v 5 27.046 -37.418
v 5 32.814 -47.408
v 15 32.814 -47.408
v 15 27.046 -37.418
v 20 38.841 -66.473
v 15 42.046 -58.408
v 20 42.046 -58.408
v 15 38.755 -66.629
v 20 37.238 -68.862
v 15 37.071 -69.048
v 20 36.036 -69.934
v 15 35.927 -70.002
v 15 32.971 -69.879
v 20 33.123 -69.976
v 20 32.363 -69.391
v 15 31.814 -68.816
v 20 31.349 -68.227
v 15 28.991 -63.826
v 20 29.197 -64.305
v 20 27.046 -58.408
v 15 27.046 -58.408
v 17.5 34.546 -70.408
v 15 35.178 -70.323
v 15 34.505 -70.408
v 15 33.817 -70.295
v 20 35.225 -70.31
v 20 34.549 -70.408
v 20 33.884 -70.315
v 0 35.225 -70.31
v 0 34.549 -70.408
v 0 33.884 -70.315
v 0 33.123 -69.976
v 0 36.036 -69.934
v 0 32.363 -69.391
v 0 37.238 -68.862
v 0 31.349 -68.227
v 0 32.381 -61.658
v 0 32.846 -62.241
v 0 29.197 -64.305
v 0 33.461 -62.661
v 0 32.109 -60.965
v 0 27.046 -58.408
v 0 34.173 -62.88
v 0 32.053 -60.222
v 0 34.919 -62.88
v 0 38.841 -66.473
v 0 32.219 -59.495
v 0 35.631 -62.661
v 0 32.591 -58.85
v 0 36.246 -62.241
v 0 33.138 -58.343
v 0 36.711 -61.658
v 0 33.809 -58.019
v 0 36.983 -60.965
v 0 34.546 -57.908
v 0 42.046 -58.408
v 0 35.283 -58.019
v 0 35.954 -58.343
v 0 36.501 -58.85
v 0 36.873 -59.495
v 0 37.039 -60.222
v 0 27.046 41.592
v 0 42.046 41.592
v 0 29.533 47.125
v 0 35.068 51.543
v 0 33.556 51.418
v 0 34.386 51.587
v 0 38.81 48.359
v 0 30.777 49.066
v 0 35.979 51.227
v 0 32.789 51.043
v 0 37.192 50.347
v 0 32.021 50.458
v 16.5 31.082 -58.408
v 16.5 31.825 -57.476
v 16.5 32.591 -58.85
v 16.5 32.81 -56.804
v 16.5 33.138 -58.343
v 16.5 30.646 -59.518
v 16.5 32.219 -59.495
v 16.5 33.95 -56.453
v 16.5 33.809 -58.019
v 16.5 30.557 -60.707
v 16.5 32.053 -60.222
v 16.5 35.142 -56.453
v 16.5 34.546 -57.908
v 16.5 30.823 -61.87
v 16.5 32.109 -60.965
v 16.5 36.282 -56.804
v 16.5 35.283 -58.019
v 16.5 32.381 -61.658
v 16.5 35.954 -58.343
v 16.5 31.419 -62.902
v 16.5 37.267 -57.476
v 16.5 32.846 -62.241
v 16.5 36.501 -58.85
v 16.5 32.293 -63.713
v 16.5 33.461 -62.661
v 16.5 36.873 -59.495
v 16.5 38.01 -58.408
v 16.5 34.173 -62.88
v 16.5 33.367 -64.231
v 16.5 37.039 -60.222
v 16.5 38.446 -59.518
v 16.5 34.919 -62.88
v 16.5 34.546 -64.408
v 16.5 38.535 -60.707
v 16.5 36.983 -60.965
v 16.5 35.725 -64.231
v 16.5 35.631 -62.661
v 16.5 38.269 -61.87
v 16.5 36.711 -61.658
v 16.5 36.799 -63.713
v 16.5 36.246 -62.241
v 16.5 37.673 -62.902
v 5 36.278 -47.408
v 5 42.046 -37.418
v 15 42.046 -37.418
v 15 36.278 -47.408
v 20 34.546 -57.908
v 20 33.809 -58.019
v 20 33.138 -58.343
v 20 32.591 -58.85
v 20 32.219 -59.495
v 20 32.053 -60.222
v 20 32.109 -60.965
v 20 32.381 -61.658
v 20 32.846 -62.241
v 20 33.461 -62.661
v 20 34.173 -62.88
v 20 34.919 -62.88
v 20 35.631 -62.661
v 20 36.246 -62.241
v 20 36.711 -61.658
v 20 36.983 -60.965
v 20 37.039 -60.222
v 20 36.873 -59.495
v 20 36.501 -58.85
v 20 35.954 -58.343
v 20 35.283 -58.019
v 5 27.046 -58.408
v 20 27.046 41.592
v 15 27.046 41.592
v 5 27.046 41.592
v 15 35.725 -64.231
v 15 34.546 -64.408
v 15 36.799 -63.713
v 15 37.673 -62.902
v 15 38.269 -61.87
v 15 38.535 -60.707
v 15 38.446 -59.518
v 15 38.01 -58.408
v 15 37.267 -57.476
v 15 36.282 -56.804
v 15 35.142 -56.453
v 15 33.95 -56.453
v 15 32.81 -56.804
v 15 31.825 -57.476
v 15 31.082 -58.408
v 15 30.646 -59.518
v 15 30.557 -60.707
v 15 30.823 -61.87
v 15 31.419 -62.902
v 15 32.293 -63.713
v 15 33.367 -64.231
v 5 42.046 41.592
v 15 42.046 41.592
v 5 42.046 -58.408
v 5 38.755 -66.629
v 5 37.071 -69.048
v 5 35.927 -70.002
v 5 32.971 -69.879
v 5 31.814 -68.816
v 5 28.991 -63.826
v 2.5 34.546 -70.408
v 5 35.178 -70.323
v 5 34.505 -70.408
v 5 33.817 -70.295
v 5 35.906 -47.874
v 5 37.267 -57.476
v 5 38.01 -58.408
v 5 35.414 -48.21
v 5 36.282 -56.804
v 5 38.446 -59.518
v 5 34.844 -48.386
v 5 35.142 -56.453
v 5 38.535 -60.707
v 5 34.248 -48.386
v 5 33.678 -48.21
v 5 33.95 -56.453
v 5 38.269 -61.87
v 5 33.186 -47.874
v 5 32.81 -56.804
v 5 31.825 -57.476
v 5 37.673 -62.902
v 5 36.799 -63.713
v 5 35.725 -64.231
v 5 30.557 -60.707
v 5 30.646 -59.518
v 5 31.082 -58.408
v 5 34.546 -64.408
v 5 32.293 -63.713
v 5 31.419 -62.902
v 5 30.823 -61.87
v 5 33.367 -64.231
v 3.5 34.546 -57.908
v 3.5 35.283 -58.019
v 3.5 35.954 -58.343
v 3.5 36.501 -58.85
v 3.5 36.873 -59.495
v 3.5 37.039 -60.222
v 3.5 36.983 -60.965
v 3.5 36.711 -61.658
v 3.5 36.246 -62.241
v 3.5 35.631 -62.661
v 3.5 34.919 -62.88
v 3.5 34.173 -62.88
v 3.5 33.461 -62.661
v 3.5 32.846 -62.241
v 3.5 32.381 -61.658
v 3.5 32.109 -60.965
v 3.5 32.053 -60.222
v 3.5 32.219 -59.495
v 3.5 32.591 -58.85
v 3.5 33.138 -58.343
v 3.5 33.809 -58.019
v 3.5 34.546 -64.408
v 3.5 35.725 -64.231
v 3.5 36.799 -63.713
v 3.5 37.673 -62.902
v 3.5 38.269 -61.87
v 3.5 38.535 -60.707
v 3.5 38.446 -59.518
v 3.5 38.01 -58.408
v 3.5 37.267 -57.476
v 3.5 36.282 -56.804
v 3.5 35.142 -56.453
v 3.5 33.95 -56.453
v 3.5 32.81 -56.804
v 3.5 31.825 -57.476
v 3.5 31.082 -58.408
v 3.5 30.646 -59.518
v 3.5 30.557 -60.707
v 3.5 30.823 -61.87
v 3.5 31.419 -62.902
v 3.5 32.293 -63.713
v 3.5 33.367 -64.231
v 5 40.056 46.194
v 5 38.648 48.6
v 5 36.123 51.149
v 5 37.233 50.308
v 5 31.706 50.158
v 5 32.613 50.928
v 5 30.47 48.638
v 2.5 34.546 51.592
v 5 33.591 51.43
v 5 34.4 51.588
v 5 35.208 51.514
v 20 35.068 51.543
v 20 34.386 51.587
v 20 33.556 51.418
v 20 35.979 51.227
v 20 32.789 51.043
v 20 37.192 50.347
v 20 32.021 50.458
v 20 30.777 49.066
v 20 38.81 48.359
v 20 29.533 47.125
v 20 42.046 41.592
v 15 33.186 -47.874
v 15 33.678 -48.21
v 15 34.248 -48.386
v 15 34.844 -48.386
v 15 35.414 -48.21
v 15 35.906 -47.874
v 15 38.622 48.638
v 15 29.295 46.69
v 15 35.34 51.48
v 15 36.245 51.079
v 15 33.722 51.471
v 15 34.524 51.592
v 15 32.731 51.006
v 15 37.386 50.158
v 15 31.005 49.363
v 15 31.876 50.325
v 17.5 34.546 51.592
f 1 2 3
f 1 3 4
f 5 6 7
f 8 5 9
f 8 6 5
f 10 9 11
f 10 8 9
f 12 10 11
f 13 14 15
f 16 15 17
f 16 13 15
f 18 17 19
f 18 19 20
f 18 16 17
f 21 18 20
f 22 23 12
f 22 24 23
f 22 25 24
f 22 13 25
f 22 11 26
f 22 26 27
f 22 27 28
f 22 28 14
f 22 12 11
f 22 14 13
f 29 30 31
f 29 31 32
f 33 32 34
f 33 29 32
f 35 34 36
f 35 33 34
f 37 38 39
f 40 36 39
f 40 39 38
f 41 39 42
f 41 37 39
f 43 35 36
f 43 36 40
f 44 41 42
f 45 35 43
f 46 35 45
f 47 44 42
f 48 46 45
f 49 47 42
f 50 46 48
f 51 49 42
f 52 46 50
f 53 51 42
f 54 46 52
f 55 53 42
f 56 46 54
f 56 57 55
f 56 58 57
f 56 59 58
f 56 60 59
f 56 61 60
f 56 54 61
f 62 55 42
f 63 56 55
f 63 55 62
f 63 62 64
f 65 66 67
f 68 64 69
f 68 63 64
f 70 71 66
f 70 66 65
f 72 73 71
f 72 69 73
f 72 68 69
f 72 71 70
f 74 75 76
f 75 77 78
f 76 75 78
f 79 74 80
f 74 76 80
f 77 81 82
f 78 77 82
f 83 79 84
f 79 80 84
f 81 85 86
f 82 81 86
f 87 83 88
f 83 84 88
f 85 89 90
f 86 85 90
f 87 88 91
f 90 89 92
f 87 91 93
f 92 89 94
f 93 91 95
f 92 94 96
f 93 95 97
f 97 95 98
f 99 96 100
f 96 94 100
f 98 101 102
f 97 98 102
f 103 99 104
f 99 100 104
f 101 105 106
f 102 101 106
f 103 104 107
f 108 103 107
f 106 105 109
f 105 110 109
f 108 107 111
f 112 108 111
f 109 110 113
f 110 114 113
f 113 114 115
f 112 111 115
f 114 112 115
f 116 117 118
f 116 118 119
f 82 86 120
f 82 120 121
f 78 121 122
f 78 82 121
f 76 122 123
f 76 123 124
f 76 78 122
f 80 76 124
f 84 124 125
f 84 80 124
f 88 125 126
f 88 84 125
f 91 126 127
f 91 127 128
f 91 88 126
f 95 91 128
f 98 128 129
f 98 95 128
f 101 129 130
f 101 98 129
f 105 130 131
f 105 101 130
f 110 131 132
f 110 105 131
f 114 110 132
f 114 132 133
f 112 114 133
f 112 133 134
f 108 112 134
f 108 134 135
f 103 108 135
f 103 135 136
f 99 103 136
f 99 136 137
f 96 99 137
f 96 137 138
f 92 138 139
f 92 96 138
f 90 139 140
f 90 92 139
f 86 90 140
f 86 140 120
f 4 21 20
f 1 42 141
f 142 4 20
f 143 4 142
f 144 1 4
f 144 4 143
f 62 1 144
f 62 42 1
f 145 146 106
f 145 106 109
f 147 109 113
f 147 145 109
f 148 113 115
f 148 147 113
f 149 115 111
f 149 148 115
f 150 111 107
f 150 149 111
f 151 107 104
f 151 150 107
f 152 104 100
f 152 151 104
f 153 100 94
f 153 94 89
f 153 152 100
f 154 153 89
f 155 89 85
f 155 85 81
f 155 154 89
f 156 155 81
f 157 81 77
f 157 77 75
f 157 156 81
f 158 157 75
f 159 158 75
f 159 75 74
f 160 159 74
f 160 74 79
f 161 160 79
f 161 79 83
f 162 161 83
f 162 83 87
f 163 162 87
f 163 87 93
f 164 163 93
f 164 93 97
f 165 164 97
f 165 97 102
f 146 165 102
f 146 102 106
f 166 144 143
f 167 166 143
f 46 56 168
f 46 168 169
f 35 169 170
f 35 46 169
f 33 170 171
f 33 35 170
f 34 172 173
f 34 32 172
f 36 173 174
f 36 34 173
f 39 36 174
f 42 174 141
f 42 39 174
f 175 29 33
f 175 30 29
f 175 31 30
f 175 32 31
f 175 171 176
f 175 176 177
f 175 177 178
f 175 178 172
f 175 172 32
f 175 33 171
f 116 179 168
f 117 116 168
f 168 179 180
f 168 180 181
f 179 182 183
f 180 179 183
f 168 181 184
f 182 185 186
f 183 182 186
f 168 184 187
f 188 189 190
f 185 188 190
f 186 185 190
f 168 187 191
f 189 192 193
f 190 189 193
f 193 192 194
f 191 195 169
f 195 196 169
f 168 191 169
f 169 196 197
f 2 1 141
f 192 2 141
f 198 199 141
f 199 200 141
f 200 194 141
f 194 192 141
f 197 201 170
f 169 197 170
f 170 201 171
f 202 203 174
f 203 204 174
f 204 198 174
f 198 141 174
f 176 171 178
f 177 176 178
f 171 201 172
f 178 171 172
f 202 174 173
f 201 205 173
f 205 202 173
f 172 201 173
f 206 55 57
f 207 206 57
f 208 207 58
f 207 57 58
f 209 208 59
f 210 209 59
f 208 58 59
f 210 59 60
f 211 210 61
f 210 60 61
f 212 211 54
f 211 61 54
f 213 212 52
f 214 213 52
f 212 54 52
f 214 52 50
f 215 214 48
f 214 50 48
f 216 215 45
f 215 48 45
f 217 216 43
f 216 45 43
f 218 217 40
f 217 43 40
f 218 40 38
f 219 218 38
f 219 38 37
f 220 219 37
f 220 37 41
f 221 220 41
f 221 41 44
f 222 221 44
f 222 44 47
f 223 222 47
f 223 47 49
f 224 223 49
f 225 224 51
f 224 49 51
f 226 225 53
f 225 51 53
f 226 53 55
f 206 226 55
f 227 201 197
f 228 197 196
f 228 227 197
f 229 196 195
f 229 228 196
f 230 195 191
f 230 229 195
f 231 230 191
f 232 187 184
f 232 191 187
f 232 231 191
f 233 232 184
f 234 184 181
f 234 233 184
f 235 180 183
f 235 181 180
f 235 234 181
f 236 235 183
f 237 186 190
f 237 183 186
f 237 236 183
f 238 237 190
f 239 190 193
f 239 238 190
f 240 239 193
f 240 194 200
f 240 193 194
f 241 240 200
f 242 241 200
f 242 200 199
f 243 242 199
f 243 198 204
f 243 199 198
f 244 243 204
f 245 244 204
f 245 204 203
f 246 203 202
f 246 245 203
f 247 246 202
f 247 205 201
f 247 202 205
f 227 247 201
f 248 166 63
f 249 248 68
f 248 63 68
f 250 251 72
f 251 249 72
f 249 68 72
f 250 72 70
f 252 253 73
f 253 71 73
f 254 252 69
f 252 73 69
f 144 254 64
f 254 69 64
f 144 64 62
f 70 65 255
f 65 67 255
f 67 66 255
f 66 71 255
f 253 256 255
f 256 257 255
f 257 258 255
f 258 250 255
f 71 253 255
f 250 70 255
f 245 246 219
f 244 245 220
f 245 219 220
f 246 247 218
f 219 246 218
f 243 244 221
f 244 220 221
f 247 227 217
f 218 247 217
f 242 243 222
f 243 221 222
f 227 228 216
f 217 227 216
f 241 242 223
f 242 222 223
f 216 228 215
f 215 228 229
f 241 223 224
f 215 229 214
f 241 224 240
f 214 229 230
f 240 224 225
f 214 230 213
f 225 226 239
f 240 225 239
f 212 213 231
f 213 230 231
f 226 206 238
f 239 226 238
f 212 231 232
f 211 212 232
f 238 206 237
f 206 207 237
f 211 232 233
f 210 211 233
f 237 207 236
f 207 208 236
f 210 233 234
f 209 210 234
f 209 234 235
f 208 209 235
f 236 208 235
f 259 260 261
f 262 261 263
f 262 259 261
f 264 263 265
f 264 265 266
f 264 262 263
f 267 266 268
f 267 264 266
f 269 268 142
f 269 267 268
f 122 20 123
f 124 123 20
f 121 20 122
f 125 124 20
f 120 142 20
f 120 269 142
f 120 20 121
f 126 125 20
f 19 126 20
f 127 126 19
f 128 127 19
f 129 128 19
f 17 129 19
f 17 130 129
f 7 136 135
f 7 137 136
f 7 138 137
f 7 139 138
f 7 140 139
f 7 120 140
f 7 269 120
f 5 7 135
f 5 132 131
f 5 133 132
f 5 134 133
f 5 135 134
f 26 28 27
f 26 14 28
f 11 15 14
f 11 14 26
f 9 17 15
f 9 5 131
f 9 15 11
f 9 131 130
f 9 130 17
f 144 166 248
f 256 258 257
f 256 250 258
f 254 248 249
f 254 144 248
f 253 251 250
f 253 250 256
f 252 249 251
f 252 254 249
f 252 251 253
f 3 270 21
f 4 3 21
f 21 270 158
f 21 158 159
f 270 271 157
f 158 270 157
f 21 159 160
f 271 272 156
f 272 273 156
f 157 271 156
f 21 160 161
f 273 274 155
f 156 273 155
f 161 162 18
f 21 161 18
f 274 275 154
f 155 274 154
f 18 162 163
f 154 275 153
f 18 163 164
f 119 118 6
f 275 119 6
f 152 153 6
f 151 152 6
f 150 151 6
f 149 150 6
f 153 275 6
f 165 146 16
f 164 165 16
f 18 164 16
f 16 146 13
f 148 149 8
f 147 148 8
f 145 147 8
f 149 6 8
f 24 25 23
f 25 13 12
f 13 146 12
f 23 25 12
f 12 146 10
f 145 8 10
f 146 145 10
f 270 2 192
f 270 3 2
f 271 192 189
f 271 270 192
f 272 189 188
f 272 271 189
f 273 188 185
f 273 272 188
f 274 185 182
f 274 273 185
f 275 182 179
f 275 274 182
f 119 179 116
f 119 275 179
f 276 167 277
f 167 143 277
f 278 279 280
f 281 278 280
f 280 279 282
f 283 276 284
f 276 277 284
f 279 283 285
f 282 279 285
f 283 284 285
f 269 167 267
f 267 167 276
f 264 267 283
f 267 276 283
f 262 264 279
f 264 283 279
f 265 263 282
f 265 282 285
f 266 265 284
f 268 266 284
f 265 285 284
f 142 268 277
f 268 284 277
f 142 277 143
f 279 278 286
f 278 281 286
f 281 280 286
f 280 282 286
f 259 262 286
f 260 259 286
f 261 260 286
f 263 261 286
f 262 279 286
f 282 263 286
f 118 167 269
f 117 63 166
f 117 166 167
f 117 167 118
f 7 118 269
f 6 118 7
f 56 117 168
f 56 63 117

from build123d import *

# Parameters (mm, degrees)
SKETCH1_R               = 4
BOSS_EXTRUDE1_DEPTH     = 20
CUT_EXTRUDE1_DEPTH      = 52
CUT_EXTRUDE1_DEPTH_BACK = 35
SKETCH2_W               = 10
SKETCH2_H               = 20
SKETCH3_W               = 10
SKETCH3_H               = 10
CUT_EXTRUDE2_DEPTH      = 52
CUT_EXTRUDE3_START      = -5
CUT_EXTRUDE3_DEPTH      = 10
CUT_EXTRUDE4_START      = -5
CUT_EXTRUDE4_DEPTH      = 10
FILLET1_R               = 2
SKETCH9_R               = 4
SKETCH9_R_2             = 2.5
BOSS_EXTRUDE2_DEPTH     = 3.5
BOSS_EXTRUDE3_START     = -3.5
SKETCH10_R              = 4
SKETCH10_R_2            = 2.5
BOSS_EXTRUDE3_DEPTH     = 3.5


with BuildPart() as part:
    # Sketch1 → Boss-Extrude1 (new body)
    with BuildSketch(Plane(origin=(0, 0, 0), x_dir=(0, 0, -1), z_dir=(1, 0, 0))):
        with BuildLine():
            Line((-41.59166249, 42.046001407), (58.40833751, 42.046001407))
            add(Edge.make_bspline(
                [(58.40833751, 42.046001407), (82.40833751, 34.546001407), (58.40833751, 27.046001407)],
                knots=[0, 0, 0, 1, 1, 1], degree=2))
            Line((58.40833751, 27.046001407), (-41.59166249, 27.046001407))
            add(Edge.make_bspline(
                [(-41.59166249, 42.046001407), (-61.59166249, 34.546001407), (-41.59166249, 27.046001407)],
                knots=[0, 0, 0, 1, 1, 1], degree=2))
        make_face()
        with Locations((60.40833751, 34.546001407)):
            Circle(SKETCH1_R, mode=Mode.SUBTRACT)
    extrude(amount=BOSS_EXTRUDE1_DEPTH)

    # Sketch2 → Cut-Extrude1 (cut, two sides: drawn at the far end of the back side and taken through both)
    with BuildSketch(Plane(origin=(0, 0, 0), x_dir=(1, 0, 0), z_dir=(0, 1, 0)).offset(-CUT_EXTRUDE1_DEPTH_BACK)):
        with Locations((10, 60.40833751)):
            Rectangle(SKETCH2_W, SKETCH2_H)
    extrude(amount=CUT_EXTRUDE1_DEPTH + CUT_EXTRUDE1_DEPTH_BACK, mode=Mode.SUBTRACT)

    # Sketch3 → Cut-Extrude2 (cut)
    with BuildSketch(Plane.XZ.offset(-27.046001407)):
        with Locations((10, 46.59166249)):
            Rectangle(SKETCH3_W, SKETCH3_H)
    extrude(amount=-CUT_EXTRUDE2_DEPTH, mode=Mode.SUBTRACT)

    # Sketch4 → Cut-Extrude3 (cut)
    with BuildSketch(Plane.ZY.offset(CUT_EXTRUDE3_START)):
        Polygon((-50.40833751, 34.546001407), (-50.40833751, 42.046001407), (-37.417956453, 42.046001407), align=None)
    extrude(amount=-CUT_EXTRUDE3_DEPTH, mode=Mode.SUBTRACT)

    # Sketch5 → Cut-Extrude4 (cut)
    with BuildSketch(Plane.ZY.offset(CUT_EXTRUDE4_START)):
        Polygon((-50.40833751, 27.046001407), (-50.40833751, 34.546001407), (-37.417956453, 27.046001407), align=None)
    extrude(amount=-CUT_EXTRUDE4_DEPTH, mode=Mode.SUBTRACT)

    # Fillet1
    fillet1_edges = [part.edges().sort_by_distance(p)[0] for p in [
        (10, 34.546001407, -50.40833751),
    ]]
    fillet(fillet1_edges, radius=FILLET1_R)

    # Sketch9 → Boss-Extrude2 (add)
    with BuildSketch(Plane.ZY):
        with Locations((-60.40833751, 34.546001407)):
            Circle(SKETCH9_R)
        with Locations((-60.40833751, 34.546001407)):
            Circle(SKETCH9_R_2, mode=Mode.SUBTRACT)
    extrude(amount=-BOSS_EXTRUDE2_DEPTH)

    # Sketch10 → Boss-Extrude3 (add)
    with BuildSketch(Plane(origin=(20, 0, 0), x_dir=(0, 0, -1), z_dir=(1, 0, 0)).offset(BOSS_EXTRUDE3_START)):
        with Locations((60.40833751, 34.546001407)):
            Circle(SKETCH10_R)
        with Locations(Location((60.40833751, 34.546001407, 0), (0, 0, 180))):
            Circle(SKETCH10_R_2, mode=Mode.SUBTRACT)
    extrude(amount=BOSS_EXTRUDE3_DEPTH)


solid = part.part
